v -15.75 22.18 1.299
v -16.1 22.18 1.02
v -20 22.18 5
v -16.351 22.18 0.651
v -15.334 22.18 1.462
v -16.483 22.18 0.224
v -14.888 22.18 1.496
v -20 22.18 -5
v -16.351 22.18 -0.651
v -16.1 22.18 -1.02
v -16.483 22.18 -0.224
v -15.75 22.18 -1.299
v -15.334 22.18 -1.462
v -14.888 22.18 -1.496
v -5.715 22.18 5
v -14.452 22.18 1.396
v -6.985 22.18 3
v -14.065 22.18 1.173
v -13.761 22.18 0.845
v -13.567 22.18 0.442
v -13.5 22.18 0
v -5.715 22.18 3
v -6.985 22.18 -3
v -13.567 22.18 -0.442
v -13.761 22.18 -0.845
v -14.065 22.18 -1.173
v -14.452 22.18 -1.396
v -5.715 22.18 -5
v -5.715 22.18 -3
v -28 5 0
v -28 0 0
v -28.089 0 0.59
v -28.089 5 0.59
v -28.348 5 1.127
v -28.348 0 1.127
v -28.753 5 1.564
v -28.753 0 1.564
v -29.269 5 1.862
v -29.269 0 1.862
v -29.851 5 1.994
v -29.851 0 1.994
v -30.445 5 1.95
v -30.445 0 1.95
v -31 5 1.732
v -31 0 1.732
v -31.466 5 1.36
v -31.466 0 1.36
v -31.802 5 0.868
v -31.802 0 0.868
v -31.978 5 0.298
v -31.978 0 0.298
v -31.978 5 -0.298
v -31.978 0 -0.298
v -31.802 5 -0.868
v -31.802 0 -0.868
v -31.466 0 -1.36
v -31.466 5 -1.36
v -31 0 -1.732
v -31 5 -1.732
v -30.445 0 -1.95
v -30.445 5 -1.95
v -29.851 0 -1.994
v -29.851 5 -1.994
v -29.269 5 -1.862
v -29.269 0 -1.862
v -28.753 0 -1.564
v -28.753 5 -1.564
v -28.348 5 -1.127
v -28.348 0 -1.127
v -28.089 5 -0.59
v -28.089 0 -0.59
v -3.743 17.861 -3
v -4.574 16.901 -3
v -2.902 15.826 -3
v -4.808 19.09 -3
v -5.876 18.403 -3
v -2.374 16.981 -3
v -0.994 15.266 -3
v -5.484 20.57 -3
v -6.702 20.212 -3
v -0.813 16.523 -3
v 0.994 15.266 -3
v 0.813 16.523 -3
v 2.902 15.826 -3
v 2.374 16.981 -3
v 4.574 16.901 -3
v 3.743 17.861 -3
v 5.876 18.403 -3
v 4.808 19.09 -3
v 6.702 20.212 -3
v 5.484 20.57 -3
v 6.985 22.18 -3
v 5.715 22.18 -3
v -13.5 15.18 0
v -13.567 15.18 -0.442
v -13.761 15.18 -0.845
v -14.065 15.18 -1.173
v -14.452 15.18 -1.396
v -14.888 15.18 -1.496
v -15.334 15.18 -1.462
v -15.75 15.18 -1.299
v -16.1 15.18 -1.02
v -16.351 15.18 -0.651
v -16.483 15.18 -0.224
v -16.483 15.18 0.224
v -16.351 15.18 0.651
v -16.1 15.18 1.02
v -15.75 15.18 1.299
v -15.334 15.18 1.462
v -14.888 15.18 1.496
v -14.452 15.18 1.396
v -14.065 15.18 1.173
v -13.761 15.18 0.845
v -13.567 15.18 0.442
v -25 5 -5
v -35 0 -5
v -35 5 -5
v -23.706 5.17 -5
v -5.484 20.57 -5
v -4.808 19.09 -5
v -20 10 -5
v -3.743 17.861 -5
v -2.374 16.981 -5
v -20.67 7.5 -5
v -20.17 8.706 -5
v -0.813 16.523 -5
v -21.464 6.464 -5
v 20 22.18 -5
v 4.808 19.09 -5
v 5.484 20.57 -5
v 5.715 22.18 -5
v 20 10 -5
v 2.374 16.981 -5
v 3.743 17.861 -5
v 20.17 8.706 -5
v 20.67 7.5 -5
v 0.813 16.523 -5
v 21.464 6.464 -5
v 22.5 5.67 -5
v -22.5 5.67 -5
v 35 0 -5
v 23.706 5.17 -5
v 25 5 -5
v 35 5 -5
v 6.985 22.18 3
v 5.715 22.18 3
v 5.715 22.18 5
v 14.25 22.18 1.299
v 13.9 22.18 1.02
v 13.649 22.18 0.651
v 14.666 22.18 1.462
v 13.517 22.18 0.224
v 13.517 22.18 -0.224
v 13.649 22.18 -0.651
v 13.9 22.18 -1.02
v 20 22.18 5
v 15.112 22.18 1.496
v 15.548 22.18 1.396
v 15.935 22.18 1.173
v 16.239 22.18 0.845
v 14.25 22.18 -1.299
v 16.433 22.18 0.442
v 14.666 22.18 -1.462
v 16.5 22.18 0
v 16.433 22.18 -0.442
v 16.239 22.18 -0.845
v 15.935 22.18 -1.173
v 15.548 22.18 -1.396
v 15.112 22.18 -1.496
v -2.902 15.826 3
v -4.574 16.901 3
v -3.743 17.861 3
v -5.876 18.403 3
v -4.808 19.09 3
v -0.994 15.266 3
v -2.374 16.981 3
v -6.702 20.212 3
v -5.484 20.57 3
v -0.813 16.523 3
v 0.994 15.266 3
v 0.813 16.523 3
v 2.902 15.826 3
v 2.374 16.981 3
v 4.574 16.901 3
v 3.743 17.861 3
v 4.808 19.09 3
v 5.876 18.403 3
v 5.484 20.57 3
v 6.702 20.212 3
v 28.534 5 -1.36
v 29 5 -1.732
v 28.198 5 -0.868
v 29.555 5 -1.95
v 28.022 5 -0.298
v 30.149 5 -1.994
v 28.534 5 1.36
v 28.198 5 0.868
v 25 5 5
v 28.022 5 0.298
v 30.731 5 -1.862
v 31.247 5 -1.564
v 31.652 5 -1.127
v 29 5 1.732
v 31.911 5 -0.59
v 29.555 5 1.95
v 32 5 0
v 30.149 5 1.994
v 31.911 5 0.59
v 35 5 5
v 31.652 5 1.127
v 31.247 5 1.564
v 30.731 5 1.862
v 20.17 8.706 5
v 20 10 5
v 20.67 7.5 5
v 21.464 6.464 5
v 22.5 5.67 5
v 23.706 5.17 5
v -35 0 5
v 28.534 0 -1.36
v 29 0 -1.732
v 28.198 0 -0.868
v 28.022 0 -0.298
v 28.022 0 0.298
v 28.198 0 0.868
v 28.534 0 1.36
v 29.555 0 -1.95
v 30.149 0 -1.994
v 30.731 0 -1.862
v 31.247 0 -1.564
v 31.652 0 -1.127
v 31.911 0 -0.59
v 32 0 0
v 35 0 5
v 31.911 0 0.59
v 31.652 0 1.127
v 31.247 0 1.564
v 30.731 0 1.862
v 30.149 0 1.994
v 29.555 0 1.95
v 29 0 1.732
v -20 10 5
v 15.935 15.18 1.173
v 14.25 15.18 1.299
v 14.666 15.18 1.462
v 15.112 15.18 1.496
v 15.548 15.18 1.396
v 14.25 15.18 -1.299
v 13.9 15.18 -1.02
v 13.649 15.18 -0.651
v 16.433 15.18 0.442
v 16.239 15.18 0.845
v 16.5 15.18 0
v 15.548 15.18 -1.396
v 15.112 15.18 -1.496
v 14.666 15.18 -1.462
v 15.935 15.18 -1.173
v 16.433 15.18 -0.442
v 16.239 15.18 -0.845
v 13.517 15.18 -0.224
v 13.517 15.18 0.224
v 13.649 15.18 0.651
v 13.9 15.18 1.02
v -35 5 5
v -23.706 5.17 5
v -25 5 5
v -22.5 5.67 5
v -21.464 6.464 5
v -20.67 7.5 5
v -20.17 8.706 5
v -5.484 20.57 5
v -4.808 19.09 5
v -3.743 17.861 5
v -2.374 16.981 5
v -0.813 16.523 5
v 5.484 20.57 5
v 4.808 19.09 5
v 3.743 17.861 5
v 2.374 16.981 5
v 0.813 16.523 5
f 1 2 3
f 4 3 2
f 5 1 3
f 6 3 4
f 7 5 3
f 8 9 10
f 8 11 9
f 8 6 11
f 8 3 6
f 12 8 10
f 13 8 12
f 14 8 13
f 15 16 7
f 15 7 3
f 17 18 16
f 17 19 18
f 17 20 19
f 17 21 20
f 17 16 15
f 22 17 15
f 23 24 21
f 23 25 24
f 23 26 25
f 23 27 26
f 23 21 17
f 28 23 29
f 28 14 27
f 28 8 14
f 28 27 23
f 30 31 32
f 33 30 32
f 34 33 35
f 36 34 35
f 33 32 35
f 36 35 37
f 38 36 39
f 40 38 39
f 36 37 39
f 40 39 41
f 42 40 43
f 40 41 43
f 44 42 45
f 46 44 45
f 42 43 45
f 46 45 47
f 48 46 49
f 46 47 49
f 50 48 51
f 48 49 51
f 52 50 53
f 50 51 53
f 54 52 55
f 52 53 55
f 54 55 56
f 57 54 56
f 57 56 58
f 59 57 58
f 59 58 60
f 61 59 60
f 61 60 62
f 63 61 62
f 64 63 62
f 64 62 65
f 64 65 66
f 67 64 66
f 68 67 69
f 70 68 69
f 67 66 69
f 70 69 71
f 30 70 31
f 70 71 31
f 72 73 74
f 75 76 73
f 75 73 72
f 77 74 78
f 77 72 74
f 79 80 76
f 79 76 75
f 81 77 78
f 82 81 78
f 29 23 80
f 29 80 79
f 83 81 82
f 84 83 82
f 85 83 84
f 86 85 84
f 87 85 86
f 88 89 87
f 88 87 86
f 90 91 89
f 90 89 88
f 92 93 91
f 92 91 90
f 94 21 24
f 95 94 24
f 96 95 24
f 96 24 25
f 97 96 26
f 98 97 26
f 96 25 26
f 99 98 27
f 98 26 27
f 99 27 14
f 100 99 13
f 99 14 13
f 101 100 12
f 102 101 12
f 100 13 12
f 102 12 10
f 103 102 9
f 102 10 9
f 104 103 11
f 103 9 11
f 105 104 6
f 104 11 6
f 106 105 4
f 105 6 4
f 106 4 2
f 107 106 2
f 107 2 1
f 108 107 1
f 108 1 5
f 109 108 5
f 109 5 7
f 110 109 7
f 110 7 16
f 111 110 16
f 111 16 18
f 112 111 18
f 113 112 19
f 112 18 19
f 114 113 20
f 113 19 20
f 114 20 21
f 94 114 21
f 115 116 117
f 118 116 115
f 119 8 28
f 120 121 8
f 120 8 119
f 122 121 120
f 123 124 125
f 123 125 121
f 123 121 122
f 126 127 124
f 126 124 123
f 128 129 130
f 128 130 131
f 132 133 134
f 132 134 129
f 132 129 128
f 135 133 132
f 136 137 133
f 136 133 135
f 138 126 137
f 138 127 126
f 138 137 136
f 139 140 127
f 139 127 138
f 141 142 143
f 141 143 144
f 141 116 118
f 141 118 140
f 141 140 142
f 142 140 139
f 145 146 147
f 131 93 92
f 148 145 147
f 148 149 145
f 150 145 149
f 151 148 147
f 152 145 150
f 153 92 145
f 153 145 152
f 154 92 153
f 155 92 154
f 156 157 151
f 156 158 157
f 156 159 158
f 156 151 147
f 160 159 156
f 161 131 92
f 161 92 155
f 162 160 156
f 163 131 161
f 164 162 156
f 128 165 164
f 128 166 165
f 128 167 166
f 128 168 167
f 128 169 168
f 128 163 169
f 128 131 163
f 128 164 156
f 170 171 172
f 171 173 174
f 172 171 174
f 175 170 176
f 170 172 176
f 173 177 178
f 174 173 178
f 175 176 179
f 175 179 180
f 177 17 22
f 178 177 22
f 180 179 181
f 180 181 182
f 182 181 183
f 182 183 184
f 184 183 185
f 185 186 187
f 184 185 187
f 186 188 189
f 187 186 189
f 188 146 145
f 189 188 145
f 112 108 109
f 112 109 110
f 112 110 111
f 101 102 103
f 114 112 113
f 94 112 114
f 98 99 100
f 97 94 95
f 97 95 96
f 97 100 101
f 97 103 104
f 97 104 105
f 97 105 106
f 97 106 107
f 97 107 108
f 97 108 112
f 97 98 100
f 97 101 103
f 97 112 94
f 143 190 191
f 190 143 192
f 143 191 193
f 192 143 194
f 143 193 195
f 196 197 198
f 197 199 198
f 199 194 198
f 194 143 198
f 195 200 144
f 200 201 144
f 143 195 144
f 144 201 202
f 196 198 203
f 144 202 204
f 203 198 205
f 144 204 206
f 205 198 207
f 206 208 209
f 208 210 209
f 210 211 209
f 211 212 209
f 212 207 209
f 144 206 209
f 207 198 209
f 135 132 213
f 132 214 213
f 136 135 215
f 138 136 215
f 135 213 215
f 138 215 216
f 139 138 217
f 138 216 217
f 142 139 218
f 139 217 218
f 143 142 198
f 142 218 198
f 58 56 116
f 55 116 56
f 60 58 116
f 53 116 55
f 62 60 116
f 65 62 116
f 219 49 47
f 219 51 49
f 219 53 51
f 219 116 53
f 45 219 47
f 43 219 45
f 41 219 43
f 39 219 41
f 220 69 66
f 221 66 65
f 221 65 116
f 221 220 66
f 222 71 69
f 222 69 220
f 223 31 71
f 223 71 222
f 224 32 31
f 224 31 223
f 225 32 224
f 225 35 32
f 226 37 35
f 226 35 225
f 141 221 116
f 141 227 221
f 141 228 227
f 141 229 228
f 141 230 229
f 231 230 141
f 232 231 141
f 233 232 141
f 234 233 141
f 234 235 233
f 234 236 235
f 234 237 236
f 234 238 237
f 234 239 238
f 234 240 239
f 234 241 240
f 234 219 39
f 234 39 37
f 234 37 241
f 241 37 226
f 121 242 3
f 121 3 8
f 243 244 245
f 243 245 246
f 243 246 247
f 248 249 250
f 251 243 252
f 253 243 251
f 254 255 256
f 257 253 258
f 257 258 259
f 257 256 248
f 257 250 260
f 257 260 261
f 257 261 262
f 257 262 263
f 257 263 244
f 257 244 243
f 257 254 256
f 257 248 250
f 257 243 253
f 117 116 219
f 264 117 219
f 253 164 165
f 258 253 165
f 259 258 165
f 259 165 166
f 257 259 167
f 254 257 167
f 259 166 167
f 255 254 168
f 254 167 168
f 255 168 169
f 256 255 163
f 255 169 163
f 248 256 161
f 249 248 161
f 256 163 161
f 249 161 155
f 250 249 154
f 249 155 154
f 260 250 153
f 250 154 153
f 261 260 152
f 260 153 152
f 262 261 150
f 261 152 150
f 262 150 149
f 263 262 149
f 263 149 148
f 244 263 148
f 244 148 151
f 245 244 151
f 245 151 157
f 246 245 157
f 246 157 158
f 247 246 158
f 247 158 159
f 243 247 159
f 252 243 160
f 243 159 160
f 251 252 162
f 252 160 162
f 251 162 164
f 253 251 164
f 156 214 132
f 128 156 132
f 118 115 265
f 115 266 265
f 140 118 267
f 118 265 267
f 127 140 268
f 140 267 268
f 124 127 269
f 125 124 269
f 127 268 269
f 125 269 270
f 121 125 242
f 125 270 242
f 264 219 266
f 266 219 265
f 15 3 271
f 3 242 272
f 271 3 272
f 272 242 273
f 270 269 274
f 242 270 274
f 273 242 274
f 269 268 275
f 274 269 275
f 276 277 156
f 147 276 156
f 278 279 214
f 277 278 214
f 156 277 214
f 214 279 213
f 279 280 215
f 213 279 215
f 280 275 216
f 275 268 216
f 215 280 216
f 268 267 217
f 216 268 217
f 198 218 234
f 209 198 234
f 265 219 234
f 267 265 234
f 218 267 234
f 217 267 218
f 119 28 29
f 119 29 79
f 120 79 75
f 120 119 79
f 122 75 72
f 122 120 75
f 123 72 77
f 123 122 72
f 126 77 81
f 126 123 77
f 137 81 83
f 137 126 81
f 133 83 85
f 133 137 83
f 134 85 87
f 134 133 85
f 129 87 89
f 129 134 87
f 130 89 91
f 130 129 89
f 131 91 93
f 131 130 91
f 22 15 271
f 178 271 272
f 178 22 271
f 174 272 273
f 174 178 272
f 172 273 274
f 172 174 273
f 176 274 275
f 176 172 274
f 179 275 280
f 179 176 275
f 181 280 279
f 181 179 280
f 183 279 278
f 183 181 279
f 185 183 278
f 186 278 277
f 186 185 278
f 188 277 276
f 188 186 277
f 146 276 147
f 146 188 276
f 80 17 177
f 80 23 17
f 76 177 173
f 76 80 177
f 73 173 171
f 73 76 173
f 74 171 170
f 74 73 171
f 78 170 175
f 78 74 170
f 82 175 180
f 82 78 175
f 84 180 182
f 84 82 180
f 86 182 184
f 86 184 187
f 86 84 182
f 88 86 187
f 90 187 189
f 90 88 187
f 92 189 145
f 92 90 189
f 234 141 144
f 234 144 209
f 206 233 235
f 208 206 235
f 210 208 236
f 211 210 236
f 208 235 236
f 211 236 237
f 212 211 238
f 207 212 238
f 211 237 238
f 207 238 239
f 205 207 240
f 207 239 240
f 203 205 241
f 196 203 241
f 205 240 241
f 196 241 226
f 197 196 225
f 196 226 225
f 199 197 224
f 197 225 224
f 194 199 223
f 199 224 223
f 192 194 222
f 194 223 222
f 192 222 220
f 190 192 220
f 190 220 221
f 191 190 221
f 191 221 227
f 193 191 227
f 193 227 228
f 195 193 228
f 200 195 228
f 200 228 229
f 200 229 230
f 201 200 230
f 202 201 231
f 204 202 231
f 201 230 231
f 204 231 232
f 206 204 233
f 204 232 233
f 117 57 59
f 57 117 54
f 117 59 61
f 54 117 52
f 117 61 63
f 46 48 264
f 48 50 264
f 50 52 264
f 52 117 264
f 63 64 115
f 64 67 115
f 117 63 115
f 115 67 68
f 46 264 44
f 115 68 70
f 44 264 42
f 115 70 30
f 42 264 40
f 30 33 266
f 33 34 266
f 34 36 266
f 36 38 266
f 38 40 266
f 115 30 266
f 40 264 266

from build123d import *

# Parameters (mm, degrees)
SKETCH1_W           = 40
SKETCH1_H           = 10
BOSS_EXTRUDE1_DEPTH = 22.1798
CUT_EXTRUDE1_DEPTH  = 3
CUT_EXTRUDE2_DEPTH  = 5
SKETCH4_R           = 1.5
CUT_EXTRUDE3_DEPTH  = 7
SKETCH5_W           = 15
SKETCH5_H           = 10
SKETCH5_R           = 2
BOSS_EXTRUDE2_DEPTH = 5
FILLET1_R           = 5


with BuildPart() as part:
    # Sketch1 → Boss-Extrude1 (new body)
    with BuildSketch(Plane(origin=(0, 0, 0), x_dir=(1, 0, 0), z_dir=(0, 1, 0))):
        Rectangle(SKETCH1_W, SKETCH1_H)
    extrude(amount=BOSS_EXTRUDE1_DEPTH)

    # Sketch2 → Cut-Extrude1 (cut, symmetric)
    with BuildSketch(Plane(origin=(0, 0, 0), x_dir=(-1, 0, 0), z_dir=(0, 0, -1))):
        with BuildLine():
            Line((-6.985, 22.1798), (6.985, 22.1798))
            ThreePointArc((6.985, 22.1798), (0, 15.1948), (-6.985, 22.1798))
        make_face()
    extrude(amount=CUT_EXTRUDE1_DEPTH, both=True, mode=Mode.SUBTRACT)

    # Sketch3 → Cut-Extrude2 (cut, symmetric)
    with BuildSketch(Plane(origin=(0, 0, 0), x_dir=(-1, 0, 0), z_dir=(0, 0, -1))):
        with BuildLine():
            Line((-5.715, 22.1798), (5.715, 22.1798))
            ThreePointArc((5.715, 22.1798), (0, 16.4648), (-5.715, 22.1798))
        make_face()
    extrude(amount=CUT_EXTRUDE2_DEPTH, both=True, mode=Mode.SUBTRACT)

    # Sketch4 → Cut-Extrude3 (cut)
    with BuildSketch(Plane(origin=(0, 22.1798, 0), x_dir=(1, 0, 0), z_dir=(0, 1, 0))):
        with Locations((15, 0)):
            Circle(SKETCH4_R)
        with Locations((-15, 0)):
            Circle(SKETCH4_R)
    extrude(amount=-CUT_EXTRUDE3_DEPTH, mode=Mode.SUBTRACT)

    # Sketch5 → Boss-Extrude2 (add)
    with BuildSketch(Plane.XZ):
        with Locations((-27.5, 0)):
            Rectangle(SKETCH5_W, SKETCH5_H)
        with Locations((-30, 0)):
            Circle(SKETCH5_R, mode=Mode.SUBTRACT)
        with Locations((27.5, 0)):
            Rectangle(SKETCH5_W, SKETCH5_H)
        with Locations((30, 0)):
            Circle(SKETCH5_R, mode=Mode.SUBTRACT)
    extrude(amount=-BOSS_EXTRUDE2_DEPTH)

    # Fillet1
    fillet1_edges = [part.edges().sort_by_distance(p)[0] for p in [
        (-20, 5, 0),
        (20, 5, 0),
    ]]
    fillet(fillet1_edges, radius=FILLET1_R)


solid = part.part
